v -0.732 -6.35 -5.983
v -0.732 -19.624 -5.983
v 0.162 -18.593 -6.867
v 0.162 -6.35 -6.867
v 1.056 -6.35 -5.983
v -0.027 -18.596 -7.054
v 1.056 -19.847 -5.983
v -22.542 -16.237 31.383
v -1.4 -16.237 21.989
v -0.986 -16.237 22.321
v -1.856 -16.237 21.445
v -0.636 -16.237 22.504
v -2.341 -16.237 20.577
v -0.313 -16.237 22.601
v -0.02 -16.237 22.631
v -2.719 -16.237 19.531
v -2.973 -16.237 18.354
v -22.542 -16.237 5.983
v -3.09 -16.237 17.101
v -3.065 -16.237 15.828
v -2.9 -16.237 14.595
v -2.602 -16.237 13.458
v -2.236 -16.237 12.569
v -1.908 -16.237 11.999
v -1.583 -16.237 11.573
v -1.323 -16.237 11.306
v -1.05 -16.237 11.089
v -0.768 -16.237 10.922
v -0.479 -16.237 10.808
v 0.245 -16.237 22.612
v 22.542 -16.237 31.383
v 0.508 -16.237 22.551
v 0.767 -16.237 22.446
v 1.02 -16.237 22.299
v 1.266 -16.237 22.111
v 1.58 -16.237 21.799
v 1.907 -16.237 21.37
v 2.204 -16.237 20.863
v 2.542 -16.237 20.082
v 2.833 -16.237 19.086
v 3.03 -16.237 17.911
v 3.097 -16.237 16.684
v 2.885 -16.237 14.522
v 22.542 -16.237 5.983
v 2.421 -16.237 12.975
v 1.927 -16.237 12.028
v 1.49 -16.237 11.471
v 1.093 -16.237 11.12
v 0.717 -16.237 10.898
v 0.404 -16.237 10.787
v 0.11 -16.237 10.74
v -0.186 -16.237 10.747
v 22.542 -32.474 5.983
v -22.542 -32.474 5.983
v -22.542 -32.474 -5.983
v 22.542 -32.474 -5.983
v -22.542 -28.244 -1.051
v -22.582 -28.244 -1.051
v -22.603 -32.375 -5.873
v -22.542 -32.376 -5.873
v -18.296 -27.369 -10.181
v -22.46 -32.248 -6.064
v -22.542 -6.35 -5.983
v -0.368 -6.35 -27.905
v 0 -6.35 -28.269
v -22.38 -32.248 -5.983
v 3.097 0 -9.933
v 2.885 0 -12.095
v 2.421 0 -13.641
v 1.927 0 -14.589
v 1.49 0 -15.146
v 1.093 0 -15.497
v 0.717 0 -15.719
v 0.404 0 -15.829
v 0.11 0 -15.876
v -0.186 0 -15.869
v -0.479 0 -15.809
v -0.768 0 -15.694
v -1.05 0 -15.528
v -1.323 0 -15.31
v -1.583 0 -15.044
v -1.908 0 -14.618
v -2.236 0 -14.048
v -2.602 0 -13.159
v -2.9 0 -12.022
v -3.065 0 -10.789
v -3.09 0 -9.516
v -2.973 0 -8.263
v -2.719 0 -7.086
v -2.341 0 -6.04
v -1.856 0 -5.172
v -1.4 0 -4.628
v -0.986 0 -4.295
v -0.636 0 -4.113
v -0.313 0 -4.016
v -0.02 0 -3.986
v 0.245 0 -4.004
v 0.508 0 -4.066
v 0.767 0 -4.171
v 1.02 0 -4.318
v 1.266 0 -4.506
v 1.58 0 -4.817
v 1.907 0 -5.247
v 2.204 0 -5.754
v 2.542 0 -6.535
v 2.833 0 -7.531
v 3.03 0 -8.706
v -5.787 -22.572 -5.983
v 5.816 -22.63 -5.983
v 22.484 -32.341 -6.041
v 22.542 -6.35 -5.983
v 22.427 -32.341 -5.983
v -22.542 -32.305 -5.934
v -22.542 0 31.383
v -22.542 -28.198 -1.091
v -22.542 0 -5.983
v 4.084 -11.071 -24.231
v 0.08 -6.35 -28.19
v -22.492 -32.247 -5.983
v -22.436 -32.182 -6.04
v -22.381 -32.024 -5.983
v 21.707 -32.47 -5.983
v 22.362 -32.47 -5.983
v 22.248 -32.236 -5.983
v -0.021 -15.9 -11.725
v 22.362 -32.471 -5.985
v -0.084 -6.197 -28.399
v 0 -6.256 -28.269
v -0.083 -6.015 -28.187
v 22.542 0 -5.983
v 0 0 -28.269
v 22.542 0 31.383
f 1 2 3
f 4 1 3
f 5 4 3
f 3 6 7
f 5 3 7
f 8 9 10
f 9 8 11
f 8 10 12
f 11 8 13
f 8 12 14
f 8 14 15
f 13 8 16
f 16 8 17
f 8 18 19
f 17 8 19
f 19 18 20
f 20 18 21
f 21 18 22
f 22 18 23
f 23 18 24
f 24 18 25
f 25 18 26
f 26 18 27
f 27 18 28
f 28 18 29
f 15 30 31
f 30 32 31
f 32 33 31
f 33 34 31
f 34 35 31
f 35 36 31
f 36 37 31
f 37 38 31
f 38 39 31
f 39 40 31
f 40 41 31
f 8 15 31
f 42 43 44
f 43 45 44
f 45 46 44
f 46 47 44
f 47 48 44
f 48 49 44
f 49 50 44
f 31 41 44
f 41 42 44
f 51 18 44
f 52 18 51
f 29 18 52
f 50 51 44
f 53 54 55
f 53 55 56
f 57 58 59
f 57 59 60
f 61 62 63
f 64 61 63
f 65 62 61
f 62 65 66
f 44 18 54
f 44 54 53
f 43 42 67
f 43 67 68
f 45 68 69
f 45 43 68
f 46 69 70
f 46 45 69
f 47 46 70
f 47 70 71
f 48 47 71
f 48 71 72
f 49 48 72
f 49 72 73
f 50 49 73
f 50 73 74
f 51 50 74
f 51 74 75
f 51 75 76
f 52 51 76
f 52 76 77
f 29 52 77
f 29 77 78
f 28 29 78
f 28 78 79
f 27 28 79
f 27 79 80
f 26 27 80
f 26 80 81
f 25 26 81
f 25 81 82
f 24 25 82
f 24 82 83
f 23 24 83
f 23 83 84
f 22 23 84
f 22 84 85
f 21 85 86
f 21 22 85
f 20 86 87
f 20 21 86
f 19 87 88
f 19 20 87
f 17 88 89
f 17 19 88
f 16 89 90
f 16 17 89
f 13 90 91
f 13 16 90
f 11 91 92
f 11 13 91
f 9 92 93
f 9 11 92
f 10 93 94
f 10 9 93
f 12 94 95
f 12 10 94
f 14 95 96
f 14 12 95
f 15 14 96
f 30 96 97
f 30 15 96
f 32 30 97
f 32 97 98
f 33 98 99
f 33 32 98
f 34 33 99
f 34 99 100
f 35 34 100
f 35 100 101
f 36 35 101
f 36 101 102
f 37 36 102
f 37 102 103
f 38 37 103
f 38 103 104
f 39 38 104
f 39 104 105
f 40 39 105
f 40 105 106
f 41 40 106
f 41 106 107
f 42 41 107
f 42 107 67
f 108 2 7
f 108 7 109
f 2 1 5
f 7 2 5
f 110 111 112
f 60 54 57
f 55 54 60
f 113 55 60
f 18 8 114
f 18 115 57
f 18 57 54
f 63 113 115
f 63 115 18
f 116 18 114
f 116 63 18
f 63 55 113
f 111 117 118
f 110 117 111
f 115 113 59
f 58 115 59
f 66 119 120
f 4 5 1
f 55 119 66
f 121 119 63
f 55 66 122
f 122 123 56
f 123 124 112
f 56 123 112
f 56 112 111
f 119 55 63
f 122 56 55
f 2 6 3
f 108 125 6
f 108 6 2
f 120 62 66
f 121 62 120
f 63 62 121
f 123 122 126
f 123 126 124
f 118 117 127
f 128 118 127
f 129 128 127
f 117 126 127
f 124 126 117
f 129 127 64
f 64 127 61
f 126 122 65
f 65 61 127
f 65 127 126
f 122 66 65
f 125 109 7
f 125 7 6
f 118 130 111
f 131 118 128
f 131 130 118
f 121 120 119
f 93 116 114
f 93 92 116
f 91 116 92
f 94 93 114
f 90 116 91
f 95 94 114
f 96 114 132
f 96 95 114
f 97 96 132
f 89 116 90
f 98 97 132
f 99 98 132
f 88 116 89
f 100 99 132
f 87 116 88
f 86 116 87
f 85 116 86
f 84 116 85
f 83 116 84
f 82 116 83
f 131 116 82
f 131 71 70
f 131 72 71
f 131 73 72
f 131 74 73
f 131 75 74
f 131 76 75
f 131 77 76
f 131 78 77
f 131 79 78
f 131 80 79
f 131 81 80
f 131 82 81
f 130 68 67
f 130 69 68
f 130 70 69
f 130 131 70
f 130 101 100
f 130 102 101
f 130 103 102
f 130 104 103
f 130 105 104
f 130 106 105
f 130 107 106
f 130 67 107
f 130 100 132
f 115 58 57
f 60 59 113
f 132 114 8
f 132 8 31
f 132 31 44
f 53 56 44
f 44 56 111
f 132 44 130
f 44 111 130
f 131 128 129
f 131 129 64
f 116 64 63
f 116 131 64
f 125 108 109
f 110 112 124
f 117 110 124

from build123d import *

# Parameters (mm, degrees)
F0_W      = 45.0838953257
F0_H      = 11.9667137042
F1_DEPTH  = 32.47426
F3_DEPTH  = 6.35
F4_W      = 45.0838953257
F4_H      = 16.23713
F5_DEPTH  = 25.4
F7_DEPTH  = 15.33327
F9_DEPTH  = 15.1057
F12_DEPTH = 6.35
F15_R     = 3.0971764623
F16_DEPTH = 50.8


with BuildPart() as f1:
    # F0 (on Front) → F1 (new body)
    with BuildSketch(Plane.XZ):
        Rectangle(F0_W, F0_H)
    extrude(amount=F1_DEPTH)

    # F2 (on face) → F3 (join)
    with BuildSketch(Plane(origin=(0, 0, 0), x_dir=(-1, 0, 0), z_dir=(0, 1, 0))):
        Polygon((-22.5419476628, -5.9833568521), (0, -28.2688885927), (22.5419476628, -5.9833568521), align=None)
    extrude(amount=-F3_DEPTH)

    # F4 (on face) → F5 (join)
    with BuildSketch(Plane.XY.offset(5.9833568521)):
        with Locations((0, -8.118565)):
            Rectangle(F4_W, F4_H)
    extrude(amount=F5_DEPTH)

    # F6 (on face) → F7 (join)
    with BuildSketch(Plane(origin=(-14.1335193941, 0, -14.2961387765), x_dir=(0.7111398414, 0, -0.7030505857), z_dir=(-0.7030505857, 0, -0.7111398414))):
        Polygon((-11.8238745458, 6.35), (19.8744586816, 6.35), (-11.7087624967, 32.2476960719), align=None)
    extrude(amount=-F7_DEPTH)

    # F8 (on face) → F9 (join)
    with BuildSketch(Plane(origin=(14.1335193941, 0, -14.2961387765), x_dir=(0.7111398414, 0, 0.7030505857), z_dir=(0.7030505857, 0, -0.7111398414))):
        Polygon((11.742355302, 32.341375947), (-19.8744586816, 6.35), (11.8238745458, 6.35), align=None)
    extrude(amount=-F9_DEPTH)

    # F11 (on 3pt) → F12 (join)
    with BuildSketch(Plane(origin=(-0.0840004707, -16.6552165824, -19.4391446065), x_dir=(0.999994616, -0.0021350351, -0.0024919073), z_dir=(0.0032814596, 0.6506323042, 0.7593858287))):
        Polygon((22.4465951324, -20.7644402981), (0, 13.771279715), (-22.5187186152, -20.7644402981), align=None)
    extrude(amount=F12_DEPTH)

    # F15 (on 3pt) → F16 (cut)
    with BuildSketch(Plane(origin=(0, -18.3562553404, 30.0906216504), x_dir=(1, 0, 0), z_dir=(0, 0.5207793852, -0.8536912978))):
        with Locations((0, 5.1728854887)):
            Circle(F15_R)
    extrude(amount=F16_DEPTH, mode=Mode.SUBTRACT)


solid = f1.part
